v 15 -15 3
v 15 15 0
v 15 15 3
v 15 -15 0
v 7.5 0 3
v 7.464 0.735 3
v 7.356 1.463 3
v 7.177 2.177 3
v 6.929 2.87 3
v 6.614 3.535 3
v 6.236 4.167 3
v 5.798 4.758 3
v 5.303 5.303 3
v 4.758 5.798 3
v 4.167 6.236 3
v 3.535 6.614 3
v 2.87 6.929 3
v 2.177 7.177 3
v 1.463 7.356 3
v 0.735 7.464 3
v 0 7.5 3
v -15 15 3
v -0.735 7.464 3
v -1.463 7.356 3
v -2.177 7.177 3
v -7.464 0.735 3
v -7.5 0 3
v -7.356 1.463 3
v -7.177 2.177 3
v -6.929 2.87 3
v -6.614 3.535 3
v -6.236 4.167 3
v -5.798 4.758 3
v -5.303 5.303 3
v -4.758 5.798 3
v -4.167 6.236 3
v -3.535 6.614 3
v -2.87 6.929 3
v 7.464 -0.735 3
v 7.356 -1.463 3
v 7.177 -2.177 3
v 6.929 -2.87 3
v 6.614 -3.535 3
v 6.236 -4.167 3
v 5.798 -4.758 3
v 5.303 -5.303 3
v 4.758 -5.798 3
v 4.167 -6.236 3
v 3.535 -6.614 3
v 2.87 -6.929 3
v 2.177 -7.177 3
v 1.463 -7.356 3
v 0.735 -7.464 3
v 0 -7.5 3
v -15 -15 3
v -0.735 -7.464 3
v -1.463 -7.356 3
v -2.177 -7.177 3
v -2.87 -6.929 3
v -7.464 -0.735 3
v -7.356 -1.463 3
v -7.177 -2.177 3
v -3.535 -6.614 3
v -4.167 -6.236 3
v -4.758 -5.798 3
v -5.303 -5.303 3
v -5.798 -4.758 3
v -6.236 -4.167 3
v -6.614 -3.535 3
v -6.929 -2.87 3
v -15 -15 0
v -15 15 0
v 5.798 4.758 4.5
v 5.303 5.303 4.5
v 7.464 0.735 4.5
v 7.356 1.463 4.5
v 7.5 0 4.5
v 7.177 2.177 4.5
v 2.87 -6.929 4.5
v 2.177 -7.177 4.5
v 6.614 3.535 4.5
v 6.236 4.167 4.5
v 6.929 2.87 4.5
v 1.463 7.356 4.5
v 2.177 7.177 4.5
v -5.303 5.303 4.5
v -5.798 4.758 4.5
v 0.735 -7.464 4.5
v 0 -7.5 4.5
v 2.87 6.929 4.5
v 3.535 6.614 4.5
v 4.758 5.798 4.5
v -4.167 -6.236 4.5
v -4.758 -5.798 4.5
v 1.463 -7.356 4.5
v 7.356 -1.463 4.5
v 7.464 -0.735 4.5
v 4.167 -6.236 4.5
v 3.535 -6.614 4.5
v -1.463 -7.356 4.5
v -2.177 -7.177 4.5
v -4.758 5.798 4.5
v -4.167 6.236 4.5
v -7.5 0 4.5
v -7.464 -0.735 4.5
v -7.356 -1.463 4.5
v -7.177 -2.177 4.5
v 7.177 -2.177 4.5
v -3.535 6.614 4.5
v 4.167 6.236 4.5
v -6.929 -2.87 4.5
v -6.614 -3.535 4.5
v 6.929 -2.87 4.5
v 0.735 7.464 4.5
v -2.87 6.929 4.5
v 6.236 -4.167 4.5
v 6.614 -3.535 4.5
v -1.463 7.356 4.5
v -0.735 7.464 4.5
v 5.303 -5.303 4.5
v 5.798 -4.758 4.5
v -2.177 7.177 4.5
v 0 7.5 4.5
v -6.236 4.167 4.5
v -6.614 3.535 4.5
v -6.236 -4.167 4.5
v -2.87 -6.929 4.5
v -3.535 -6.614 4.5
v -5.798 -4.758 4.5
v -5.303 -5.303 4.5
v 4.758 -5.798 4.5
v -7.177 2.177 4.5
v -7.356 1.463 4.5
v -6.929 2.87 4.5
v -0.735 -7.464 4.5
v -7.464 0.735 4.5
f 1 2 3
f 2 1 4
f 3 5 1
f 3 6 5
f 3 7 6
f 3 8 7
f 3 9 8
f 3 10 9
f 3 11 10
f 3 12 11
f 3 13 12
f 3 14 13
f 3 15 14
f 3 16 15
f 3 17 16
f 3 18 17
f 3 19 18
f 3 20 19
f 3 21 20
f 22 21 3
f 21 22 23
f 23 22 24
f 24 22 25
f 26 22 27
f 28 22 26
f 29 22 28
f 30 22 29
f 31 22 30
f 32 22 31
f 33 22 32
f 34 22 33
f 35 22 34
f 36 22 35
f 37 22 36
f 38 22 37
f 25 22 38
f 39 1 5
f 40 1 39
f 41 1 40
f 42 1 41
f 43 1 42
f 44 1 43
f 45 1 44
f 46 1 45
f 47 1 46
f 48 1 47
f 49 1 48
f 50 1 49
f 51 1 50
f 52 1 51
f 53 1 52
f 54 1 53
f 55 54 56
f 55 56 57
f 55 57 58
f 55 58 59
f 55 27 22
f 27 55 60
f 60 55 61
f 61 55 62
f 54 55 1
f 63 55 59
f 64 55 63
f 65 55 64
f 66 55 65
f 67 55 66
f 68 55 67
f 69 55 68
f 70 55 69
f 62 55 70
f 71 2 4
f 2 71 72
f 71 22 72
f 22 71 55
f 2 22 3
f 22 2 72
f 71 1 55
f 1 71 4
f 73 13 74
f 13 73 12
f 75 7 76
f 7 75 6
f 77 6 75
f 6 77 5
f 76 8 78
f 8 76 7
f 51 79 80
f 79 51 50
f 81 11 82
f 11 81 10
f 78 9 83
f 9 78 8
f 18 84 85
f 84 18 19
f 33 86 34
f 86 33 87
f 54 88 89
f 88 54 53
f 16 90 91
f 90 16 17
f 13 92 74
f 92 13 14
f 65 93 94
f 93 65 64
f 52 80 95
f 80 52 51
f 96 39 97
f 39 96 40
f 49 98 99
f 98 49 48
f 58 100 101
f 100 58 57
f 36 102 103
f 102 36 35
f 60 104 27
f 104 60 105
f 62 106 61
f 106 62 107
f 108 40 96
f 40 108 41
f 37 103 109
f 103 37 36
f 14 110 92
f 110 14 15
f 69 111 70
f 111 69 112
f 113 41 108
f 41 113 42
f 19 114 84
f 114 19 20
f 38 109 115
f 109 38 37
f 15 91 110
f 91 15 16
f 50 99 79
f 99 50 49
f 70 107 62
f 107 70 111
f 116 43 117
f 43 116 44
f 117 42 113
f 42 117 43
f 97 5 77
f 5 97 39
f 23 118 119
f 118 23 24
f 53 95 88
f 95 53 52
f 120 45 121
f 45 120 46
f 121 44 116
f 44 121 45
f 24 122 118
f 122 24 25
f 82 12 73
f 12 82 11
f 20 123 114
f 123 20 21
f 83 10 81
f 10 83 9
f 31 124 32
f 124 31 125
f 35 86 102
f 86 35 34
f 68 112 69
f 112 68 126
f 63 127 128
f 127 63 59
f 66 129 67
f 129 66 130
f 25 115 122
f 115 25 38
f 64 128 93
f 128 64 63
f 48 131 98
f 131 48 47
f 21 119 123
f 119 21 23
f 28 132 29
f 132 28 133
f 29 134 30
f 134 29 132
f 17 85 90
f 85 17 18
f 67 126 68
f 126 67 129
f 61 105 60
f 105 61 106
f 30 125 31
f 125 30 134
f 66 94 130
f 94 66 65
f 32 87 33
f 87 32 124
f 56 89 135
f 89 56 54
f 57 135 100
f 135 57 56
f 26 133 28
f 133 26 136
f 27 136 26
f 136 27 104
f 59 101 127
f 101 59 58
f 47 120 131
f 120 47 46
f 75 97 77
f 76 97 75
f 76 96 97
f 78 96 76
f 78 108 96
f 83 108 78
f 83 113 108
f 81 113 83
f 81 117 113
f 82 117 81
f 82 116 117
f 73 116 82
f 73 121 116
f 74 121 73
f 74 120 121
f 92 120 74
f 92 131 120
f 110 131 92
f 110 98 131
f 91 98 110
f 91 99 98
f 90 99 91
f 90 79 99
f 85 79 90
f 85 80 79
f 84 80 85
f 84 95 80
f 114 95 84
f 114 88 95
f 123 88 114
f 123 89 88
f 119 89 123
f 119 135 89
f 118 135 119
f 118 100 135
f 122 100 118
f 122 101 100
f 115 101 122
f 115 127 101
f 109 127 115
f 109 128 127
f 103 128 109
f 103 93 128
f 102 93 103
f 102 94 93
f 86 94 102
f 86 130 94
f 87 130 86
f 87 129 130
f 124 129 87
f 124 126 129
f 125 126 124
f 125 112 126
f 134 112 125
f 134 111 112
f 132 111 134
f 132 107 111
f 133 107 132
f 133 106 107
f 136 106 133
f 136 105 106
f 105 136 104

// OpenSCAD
// testdrit

x=30;
y=x;
z=3;

translate([-x/2,-y/2,0]) {
    cube([x,y,z]);
}
translate([0,0,z]) {
    cylinder(h=z/2, d=(x+y)/4, $fn=64);
}
